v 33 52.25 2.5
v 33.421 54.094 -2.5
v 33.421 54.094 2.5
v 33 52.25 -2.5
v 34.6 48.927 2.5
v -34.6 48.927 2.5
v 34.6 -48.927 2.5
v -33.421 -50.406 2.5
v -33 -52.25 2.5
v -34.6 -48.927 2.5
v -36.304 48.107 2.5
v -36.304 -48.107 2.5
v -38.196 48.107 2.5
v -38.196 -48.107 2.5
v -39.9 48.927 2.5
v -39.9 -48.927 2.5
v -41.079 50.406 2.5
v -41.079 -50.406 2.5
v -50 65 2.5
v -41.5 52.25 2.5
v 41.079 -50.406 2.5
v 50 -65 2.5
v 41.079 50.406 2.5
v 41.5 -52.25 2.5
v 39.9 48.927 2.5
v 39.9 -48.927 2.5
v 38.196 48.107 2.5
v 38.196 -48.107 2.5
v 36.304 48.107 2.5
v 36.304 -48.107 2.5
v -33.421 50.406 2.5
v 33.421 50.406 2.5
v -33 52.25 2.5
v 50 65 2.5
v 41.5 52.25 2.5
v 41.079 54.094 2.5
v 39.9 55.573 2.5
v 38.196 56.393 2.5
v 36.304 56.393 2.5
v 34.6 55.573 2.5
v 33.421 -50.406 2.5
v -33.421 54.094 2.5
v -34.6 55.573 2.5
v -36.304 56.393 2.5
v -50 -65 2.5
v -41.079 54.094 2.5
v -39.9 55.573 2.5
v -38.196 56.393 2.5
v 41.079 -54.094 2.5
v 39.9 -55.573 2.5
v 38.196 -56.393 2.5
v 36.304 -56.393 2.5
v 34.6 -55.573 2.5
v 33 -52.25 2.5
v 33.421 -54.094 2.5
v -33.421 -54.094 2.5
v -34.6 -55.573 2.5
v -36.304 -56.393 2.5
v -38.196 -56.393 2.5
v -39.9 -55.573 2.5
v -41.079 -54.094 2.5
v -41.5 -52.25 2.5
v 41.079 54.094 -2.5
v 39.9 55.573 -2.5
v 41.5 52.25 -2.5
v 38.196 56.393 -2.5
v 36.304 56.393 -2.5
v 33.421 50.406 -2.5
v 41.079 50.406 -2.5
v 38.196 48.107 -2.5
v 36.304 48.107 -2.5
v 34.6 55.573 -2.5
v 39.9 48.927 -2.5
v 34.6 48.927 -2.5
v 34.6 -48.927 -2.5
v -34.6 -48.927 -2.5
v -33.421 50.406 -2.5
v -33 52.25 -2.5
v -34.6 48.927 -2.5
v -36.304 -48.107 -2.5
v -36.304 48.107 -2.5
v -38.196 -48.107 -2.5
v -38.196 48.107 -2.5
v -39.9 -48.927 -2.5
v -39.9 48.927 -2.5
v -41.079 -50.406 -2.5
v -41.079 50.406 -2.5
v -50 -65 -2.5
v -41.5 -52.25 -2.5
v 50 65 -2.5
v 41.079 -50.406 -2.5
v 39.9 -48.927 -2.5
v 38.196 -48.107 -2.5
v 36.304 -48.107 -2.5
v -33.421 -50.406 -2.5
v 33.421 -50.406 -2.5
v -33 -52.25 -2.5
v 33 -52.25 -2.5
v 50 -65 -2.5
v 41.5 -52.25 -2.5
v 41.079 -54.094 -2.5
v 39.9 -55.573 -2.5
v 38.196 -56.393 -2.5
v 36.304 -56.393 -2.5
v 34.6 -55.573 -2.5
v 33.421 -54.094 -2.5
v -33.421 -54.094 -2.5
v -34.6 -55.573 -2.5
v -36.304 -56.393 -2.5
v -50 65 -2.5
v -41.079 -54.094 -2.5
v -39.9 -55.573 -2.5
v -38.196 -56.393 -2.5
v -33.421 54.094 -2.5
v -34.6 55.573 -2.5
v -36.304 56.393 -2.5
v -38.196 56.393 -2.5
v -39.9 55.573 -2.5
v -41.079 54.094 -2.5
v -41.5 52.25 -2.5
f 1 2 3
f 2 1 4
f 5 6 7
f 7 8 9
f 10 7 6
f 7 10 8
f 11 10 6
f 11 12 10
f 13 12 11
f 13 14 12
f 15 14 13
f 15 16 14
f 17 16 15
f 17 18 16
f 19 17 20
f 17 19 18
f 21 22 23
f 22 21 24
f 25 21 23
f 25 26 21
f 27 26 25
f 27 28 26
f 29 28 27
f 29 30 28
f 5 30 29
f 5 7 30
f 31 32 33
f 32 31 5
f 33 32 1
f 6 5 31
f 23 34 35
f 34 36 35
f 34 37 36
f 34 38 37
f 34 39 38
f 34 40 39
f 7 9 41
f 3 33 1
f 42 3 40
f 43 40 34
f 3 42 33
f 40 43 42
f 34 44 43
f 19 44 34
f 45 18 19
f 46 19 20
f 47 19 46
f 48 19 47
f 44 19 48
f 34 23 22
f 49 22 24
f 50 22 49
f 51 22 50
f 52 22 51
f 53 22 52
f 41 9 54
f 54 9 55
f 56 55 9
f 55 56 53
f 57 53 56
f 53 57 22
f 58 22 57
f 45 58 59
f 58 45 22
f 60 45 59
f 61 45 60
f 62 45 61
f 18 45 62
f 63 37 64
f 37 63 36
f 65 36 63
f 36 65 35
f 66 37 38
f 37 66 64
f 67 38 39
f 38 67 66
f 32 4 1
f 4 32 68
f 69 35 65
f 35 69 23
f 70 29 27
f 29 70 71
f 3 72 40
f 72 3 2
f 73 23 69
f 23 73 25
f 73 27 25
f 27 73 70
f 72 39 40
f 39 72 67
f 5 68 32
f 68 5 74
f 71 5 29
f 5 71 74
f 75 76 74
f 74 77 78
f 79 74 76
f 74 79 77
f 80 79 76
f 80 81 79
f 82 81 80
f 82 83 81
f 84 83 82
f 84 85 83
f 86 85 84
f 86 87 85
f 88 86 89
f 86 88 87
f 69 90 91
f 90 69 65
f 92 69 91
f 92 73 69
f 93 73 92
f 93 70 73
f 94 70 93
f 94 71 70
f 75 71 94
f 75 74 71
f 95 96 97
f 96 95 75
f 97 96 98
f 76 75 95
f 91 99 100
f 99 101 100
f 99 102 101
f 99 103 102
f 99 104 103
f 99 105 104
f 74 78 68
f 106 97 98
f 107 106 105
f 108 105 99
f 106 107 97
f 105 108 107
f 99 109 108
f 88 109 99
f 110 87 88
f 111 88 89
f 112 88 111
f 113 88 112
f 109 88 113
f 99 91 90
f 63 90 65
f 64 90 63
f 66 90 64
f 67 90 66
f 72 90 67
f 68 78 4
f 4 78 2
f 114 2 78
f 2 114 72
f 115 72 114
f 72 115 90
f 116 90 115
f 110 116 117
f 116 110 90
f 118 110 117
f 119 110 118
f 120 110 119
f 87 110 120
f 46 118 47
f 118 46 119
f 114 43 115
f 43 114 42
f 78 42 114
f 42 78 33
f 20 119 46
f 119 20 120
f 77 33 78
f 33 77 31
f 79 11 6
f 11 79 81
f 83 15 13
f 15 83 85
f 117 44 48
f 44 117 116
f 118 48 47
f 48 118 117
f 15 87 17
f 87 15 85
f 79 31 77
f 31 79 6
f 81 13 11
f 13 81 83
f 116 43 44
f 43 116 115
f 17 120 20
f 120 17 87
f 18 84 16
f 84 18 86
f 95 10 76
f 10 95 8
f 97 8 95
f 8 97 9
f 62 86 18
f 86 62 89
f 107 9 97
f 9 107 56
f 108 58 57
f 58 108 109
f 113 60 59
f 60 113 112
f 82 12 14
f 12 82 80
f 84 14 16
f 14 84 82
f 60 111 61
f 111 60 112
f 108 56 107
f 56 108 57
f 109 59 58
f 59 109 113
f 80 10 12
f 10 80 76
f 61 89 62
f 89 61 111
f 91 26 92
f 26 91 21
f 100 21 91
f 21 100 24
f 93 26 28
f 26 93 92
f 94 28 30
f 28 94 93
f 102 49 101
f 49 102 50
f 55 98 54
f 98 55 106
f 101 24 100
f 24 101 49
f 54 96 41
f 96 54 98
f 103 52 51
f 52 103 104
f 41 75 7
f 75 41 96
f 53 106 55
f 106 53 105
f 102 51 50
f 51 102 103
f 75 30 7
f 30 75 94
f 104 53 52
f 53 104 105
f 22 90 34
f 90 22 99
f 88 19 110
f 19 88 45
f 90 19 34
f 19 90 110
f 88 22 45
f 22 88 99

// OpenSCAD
// Generated by SolidPython 1.1.3 on 2024-03-13 12:59:54


difference() {
	cube(center = true, size = [100, 130.0000000000, 5]);
	union() {
		translate(v = [37.2500000000, 52.2500000000]) {
			cylinder(center = true, h = 5, r = 4.2500000000);
		}
		translate(v = [-37.2500000000, 52.2500000000]) {
			cylinder(center = true, h = 5, r = 4.2500000000);
		}
		translate(v = [-37.2500000000, -52.2500000000]) {
			cylinder(center = true, h = 5, r = 4.2500000000);
		}
		translate(v = [37.2500000000, -52.2500000000]) {
			cylinder(center = true, h = 5, r = 4.2500000000);
		}
	}
}
/***********************************************
*********      SolidPython code:      **********
************************************************
 
import solid
import numpy as np
import numbers
import pudb
from solid.utils import *
import viewscad
import subprocess
import os
import os.path as osp
import math
import sys

chamfer_extrude=solid.import_scad("./chamfer_extrude.scad")
chamfer_extrude=chamfer_extrude.chamfer_extrude
r = viewscad.Renderer(width=800, height=800)

def debug(model,f_name,path="/home/ts/code/projects/mfd/designs/debug"):
    solid.scad_render_to_file(model,osp.join(path,f_name)+".scad")
#generate position list of wells using offset from center
wells_pos_from_center_4 = lambda offset: [[-offset,offset],
                                        [offset, offset],
                                        [-offset, -offset],
                                        [offset, -offset]]
wells_pos_from_center_2 = lambda offset: [[offset,0],
                                        [-offset,0]]

def make_well(dims,shape=None,height=None,dxf=False):
    def circle_cylinder():
        if dxf or (height is None):
            well = solid.circle(r=dims, segments=64)
        else:
            well = solid.cylinder(r=dims, h=height, segments=64, center = True)
        return well
    if dims is None:
        sys.exit("radius needs to be a number")
    if isinstance(dims, numbers.Number):
        well =circle_cylinder()
    elif len(dims)==1:
        if isinstance(dims[1], numbers.Number):
            well =circle_cylinder()
        else:
            sys.exit("radius needs to be a number")
    elif len(dims)==2:
        well = solid.square(dims,center = True)
    elif len(dims)==3:
        well = solid.cube(dims, center = True)
    return well

def wells_top_bottom(center_gap,device_dims=None,shape=None,height=None, positions = None, dxf = False,well_shape=None):
    if well_shape == None:
        well_shape = make_well(device_dims,shape=shape,height=height,dxf=dxf)
    wells = []
    if positions is None:
        offset = radius+radius/2.0
        positions = wells_pos_from_center_2(offset)
    if dxf or (height is None):
        height = 0
    for position in positions:
        if dxf:
            wells.append(solid.translate([position[0],position[1]])(well_shape))
        else:
            wells.append(solid.translate([position[0],position[1],height/2.0])(well_shape))
    return  union()(*wells)

#place wells in four corners 
def four_corner(radius,height=None, positions = None, dxf = False):
    #if well pos not specified set
    #to equally spaced by half radius
    if positions is None:
        offset = radius+radius/2.0
        positions = wells_pos_from_center_4(offset)
    if dxf or (height is None):
        height = 0
    #make wells at positions with specified radius and height
    wells = []
    for position in positions:
        #make circle if making dxf
        if dxf:
            well_shape = solid.circle(r=radius, segments=64)
            well_shape = solid.translate([position[0],position[1]])(well_shape)
        #if stl make cylinder
        else:
            well_shape = solid.cylinder(r=radius, h=height, segments=64, center = True)
            well_shape = solid.translate([position[0],position[1],height/2.0])(well_shape)
        wells.append(well_shape)
    return  union()(*wells)

#generate channels 
def make_channels(length,width,height=0,num_chans=1,max_chans=None,spacing=None, dxf = False,
                  rotate_channels=False):
    if dxf or (height is None):
        height = 0
    #if channel gap not defined, is equal to
    if spacing is None: spacing = width
    #calculate number of channels if fitting max num within given width
    if not max_chans is None:
        import math
        num_chans = math.floor((max_chans-spacing)/(width+spacing))
    #get total width of channel section  
    total_width = (width*num_chans)+(spacing*(num_chans-1))

    #make template channel
    #if rotate_channels: width, length = length, width
    if dxf:
        channel_t = solid.square([length,width],center = True)
    else:
        channel_t = solid.cube([length,width,height], center = True)

    #if number channels is even, offset the first channel to center its gap
    if num_chans % 2 == 0: centering = -(width/2.0+spacing/2.0)
    else: centering = 0
    #move template channel up to align bottom at z = 0 
    #and offset center if necessary
    if dxf:
        channel_t = solid.translate([0,centering])(channel_t)
    else:
        channel_t = solid.translate([0,centering,height/2.0])(channel_t)

    #if rotate_channels: length,width = width,length
    #start making the channels
    channels = []
    for i in range(num_chans):
        #if i=0 there is no translation
        #if i=1, we make the first channel adjacent to second
        direction = i

        #if i>=1, we add channels alternating left and right
        if i >= 1:
            direction = -(i/2.0)
            if i % 2 == 1: direction = (-direction)+0.5
                
        #make channel at right position and add it to channel list
        translation_coords = [0,direction*(width+spacing)]
        #if rotate_channels: translation_coords = [direction*(width+spacing),0]
        if dxf:
            channel = solid.translate(translation_coords)(channel_t)
        else:
            channel = solid.translate([*translation_coords,0])(channel_t)
        channels.append(channel)
    
    #group all channels as one object
    channels = union()(*channels)
    #compute the x,y,z dimensions in order to pass as arguments 
    #for construction of other parts of device (such as the chambers)
    measurements = {'x':(length/2.0,-length/2.0),
                    'y':(total_width/2.0,-total_width/2.0)}
    if not dxf:
        measurements['z'] = (height,0)
    if rotate_channels:
        channels = solid.rotate(90)(channels)
        measurements['x'],measurements['y']=measurements['y'],measurements['x']
    return channels,measurements

def make_chambers(msrs,height=None,extra=0,len_until=None,width=None, dxf = False):
    #computes x,y,z length
    total = lambda x : abs(x[0]) + abs(x[1])
    
    #if specific height if specified
    #otherwise use same height as channels
    if dxf:
        pass
    elif not height is None:
        msrs['z'] = (height,0)
    else:
        msrs['z'] = (0,0)
        
    #make copy of measurements from channels to modify chamber dimensions 
    #and add length to chambers as specified
    chamber_dims = msrs.copy()
    #calculate length of chamber to reach specified offset
    if not len_until is None:
        chamber_len = len_until-(msrs['x'][0])
    #or add specified length to channel length (if not specified, adds 0)
    else:
        chamber_len = msrs['x'][0]+extra
    #set the chamber length based 
    chamber_dims['x'] = (chamber_len/2.0,-(chamber_len/2.0))
    #compute final dimensions of chamber
    if not width is None:
        chamber_dims['y'] = (width/2.0,-width/2.0)
    chamber_dims = [total(size) for size in chamber_dims.values()]
        
    #calculate chamber translation offset to place adjacent to channels
    chamber_trslt = msrs['x'][0]+(chamber_len/2.0)
    #compute chamber translation coordinates to align with channels
    #x = 1 moves chamber above channels
    #x = -1 moves chamber below channels
    if dxf:
        trslt = lambda x : [x*(chamber_trslt),0]
    else:
        trslt = lambda x : [x*(chamber_trslt),0,msrs['z'][0]/2.0]
    
    #function to make chamber at top or at bottom 
    if dxf:
        move = lambda x : solid.translate(trslt(x))(solid.square(chamber_dims, center = True) )
    else:
        move = lambda x : solid.translate(trslt(x))(solid.cube(chamber_dims,center = True))
    #make top and bottom chambers and return them as grouped
    top = move(1)
    bottom = move(-1)
    #chambers=solid.rotate(90)(solid.union()(top,bottom))
    chambers=(solid.union()(top,bottom))

    return chambers

#create alignment features 
def alignment_features(unit,dims,grid_size, mask_size = None, alignment = "hollow", units_from_center = (2.5,2.5), corner_len=None):
    width = grid_size[0]*dims[0]
    length = grid_size[1]*dims[1]
    if mask_size is None and corner_len is None:
        corner_len = (dims[0] + dims[1]) /2 / 8
    corner = lambda thickness_div : solid.union()( solid.square([corner_len,corner_len/thickness_div],center=False), solid.square([corner_len/thickness_div,corner_len],center=False) )
    
    def make_full(thickness_div):
        thickness = corner_len/thickness_div
        tr = solid.translate([0, 0, 0 ])(solid.rotate(180)(corner(thickness_div)))
        tr = solid.translate([thickness/2,thickness/2,0])(tr)
        bl = solid.translate([0, 0, 0 ])(solid.rotate(0)(corner(thickness_div)))
        bl = solid.translate([-thickness/2,-thickness/2,0])(bl)
        return solid.union()(tr,bl)
    
    def make_hollow(thickness_div):
        thickness = corner_len/(thickness_div/2)
        inner = make_full(thickness_div)
        outer = make_full(thickness_div/2)
        hollow = outer - inner 
        return hollow
    
    center = (width /2 , length/2)
    mask_pos = lambda x,y : (center[0] + x*(float(units_from_center[0])*dims[0]), center[1] + y*(float(units_from_center[1])*dims[1]))
    positions = []
    positions.append(mask_pos(1,0))
    positions.append(mask_pos(0,1))
    positions.append(mask_pos(-1,0))
    positions.append(mask_pos(0,-1))
    make_mask = lambda mtype : make_hollow(8) if mtype == "hollow" else make_full(8)
    masks = [ solid.translate([*position,0])(make_mask(alignment)) for position in positions]
    
    solid.scad_render_to_file(solid.union()(*masks),"./designs/open_chamber/masks.scad")
    #return unit - solid.union()(*masks)
    return solid.union()(*masks,unit)

def create_outline(thickness, array, dims, grid_size,):
    width = grid_size[0]*dims[0] + thickness *2
    length = grid_size[1]*dims[1] + thickness *2
    outer = solid.translate([-thickness, -thickness,0])(solid.square([width, length]))
    return outer-array

def create_wall(wall_thickness, outline_thickness, dims, grid_size, wall_height = 2000, dxf = False):
    inner_width = grid_size[0]*dims[0] + outline_thickness *2
    inner_length = grid_size[1]*dims[1] + outline_thickness *2
    outer_width = inner_width + wall_thickness * 2
    outer_length = inner_length + wall_thickness * 2
    outer_pos_x = -outline_thickness-wall_thickness
    outer_pos_y = -outline_thickness-wall_thickness
    inner_pos_x = -outline_thickness
    inner_pos_y = -outline_thickness
    if dxf:
        inner_wall = solid.translate([inner_pos_x,
                                      inner_pos_y,
                                      0])(solid.square([inner_width, inner_length]))
        outer_wall = solid.translate([outer_pos_x,
                                      outer_pos_y,
                                      0])(solid.square([outer_width, outer_length]))

        return outer_wall-inner_wall
    else:
        inner_wall = solid.translate([inner_pos_x,
                                      inner_pos_y,
                                      0])(solid.cube([inner_width, inner_length,wall_height]))
        outer_wall = solid.translate([outer_pos_x,
                                      outer_pos_y,
                                      0])(solid.cube([outer_width, outer_length,wall_height]))

        return outer_wall-inner_wall, {'wall_height': wall_height,
                                       'wall_thickness': wall_thickness,
                                       'inner_width':inner_width,
                                       'inner_length': inner_length,
                                       'outer_width': outer_width,
                                       'outer_length': outer_length,
                                       'outer_pos_x' : outer_pos_x,
                                       'outer_pos_y' : outer_pos_y,
                                       'inner_pos_x' : inner_pos_x,
                                       'inner_pos_y' : inner_pos_y}

def create_thicker_wall(wall_thickness, outer_wall_offset, wall_dims, dims, grid_size, height_start = .2, height_end=2, dxf = False):
    addon_wall,thicker_wall_dims = create_wall(wall_thickness, outer_wall_offset, dims, grid_size, wall_height=height_end-height_start, dxf = False)
    addon_wall = solid.translate([0,0,height_start])(addon_wall)

    thicker_wall_dims['wall_height'] = height_end
    thicker_wall_dims['wall_thickness'] = wall_dims['wall_thickness'] + wall_thickness
    return addon_wall, thicker_wall_dims
 
def add_lock_to_wall(wall,wall_dims,y_offset = 0,cut_ratio=0.7,L_length=3, gap_ratio=0.05, axis="x",width_ratio=1/2):
    # Makes L shape
    def make_L(max_length,length_thickness,max_width,width_thickness,height,y_offset):
        length = solid.cube([max_length,length_thickness,height])
        width = solid.cube([width_thickness,max_width,height])
        width = solid.translate([max_length-(width_thickness),0,0])(width)
        L = solid.union()(width,length)
        debug(L,"L")
        if axis == "x":
            L = solid.rotate(-90)(L)
            L = solid.translate([0,max_length,0])(L)
        else:
            L = solid.rotate(-180)(L)
            L = solid.translate([max_length,max_width,0])(L)
        return solid.translate([0,0,y_offset])(L)
    
    lock_length = L_length
    lock_width = wall_dims['wall_thickness']*width_ratio
    lock_length_thickness = lock_width/2
    lock_width_thickness = lock_width/2
    L_lock = make_L(lock_length,lock_length_thickness,lock_width,lock_width_thickness, wall_dims['wall_height']-y_offset, y_offset)
    
    margin_space = lock_length - lock_length*(1-gap_ratio)
    key_length = lock_length-margin_space
    key_length_thickness = lock_length_thickness-(margin_space*2)
    key_width = lock_width-(margin_space*2)
    key_width_thickness = lock_width_thickness-(margin_space*2)
    L_key = make_L(key_length,key_length_thickness,key_width,key_width_thickness, wall_dims['wall_height']-y_offset, y_offset)
    L_key = solid.translate([margin_space,margin_space,0])(L_key)
    L = solid.union()(L_lock,L_key)
    debug(L,"L")
    
    #Make cube to be used as negative to split frame in a half
    #Can choose if making left or right negative, specify ratio of split
    def make_negative(right,cut_ratio):
        if axis == "x":
            if right:
                length = wall_dims['outer_length']*(1-cut_ratio)
                pos_x = wall_dims['outer_pos_x']+(wall_dims['outer_length']*cut_ratio)
            else:
                length = wall_dims['outer_length']*(cut_ratio)
                pos_x = wall_dims['outer_pos_x'] 
            negative = solid.cube([wall_dims['outer_width'],length, wall_dims['wall_height']])
            negative = solid.translate([wall_dims['outer_pos_y'],pos_x,0])(negative)
        else:
            if right:
                length = wall_dims['outer_width']*(1-cut_ratio)
                pos_x = wall_dims['outer_pos_y']+(wall_dims['outer_width']*cut_ratio)
            else:
                length = wall_dims['outer_width']*(cut_ratio)
                pos_x = wall_dims['outer_pos_y'] 
            negative = solid.cube([length,wall_dims['outer_length'], wall_dims['wall_height']])
            negative = solid.translate([pos_x,wall_dims['outer_pos_x'],0])(negative)
        return negative, pos_x, length 
                      
    #Make negatives
    negative_right, right_half_pos_x, right_half_length = make_negative(True,cut_ratio)
    negative_left, left_half_pos_x, right_half_length = make_negative(False,cut_ratio)
    #Make halves
    left_half = solid.difference()(wall,negative_right)
    right_half = solid.difference()(wall,negative_left)
    def place_L(L, L_length,L_width):
        #Place L on top wall       
        offset_to_center = (wall_dims['wall_thickness']-L_width)/2
        if axis == "x":
            y_pos_top = (wall_dims['outer_pos_y'] +
                    wall_dims['outer_width'] - 
                    L_width - offset_to_center)
            top_L = solid.translate([y_pos_top,
                                     right_half_pos_x-(L_length),
                                     0])(L)
            #Place L on bottom wall       
            y_pos_bottom = wall_dims['outer_pos_y']+offset_to_center
            bottom_L = solid.translate([y_pos_bottom,
                                        right_half_pos_x-L_length,
                                        0])(L)
        else:
            y_pos_top = (wall_dims['outer_pos_x'] +
                    wall_dims['outer_length'] -
                    (L_width+offset_to_center))
            top_L = solid.translate([right_half_pos_x-L_length,
                                     y_pos_top,
                                     0])(L)
            #Place L on bottom wall       
            y_pos_bottom = wall_dims['outer_pos_y']+offset_to_center
            bottom_L = solid.translate([right_half_pos_x-L_length,
                                        y_pos_bottom,
                                        0])(L)
        return bottom_L, top_L
    #Make complimentary L pieces through union and differences
    #Make Lock
    bottom_L_lock, top_L_lock = place_L(L_lock,L_length,lock_width)
    left_half = solid.difference()(left_half,bottom_L_lock)
    left_half = solid.difference()(left_half,top_L_lock)
    #Make Key
    bottom_L_key, top_L_key = place_L(L_key,L_length,lock_width)
    right_half = solid.union()(right_half,bottom_L_key)
    right_half = solid.union()(right_half,top_L_key)
    return left_half, right_half


#build a row x col grid of containment units
def make_unit_array(unit,dims,grid_size, dxf = False, alignment = None, mask_size = None,
                    units_from_center = None,alignment_offset=None, alignment_mark_size=1):
    units = []
    for col in range(grid_size[1]):
        for row in range(grid_size[0]):
            if dxf:
                units.append(solid.translate([row*dims[0],col*dims[1]])(unit))
            else:
                units.append(solid.translate([row*dims[0],col*dims[1],dims[2]/2.0])(unit))
    array = solid.union()(*units)
    if (not alignment is None) and dxf:
        if not alignment_offset is None:
            array = solid.translate([alignment_offset[0],alignment_offset[1]])(array)
        array = alignment_features(array,dims, grid_size, alignment = alignment, mask_size = None, units_from_center = units_from_center,corner_len=alignment_mark_size)
        if not alignment_offset is None:
            array = solid.translate([-alignment_offset[0],-alignment_offset[1]])(array)
    return array


def make_taylor(wells_pos = wells_pos_from_center_4(2.25), well_rad = 1.5 ,
                well_height = 2, chan_w = 0.01, chan_l = 1, chan_h = 0.010 ,
                chan_gap = 0.040, max_chans = None,num_chans=100, chamber_height  = 0.100,
                columns = 1, rows = 1, chamber_len_until=2.25, add_channels = True, add_wells = True, 
                add_chambers = True, save_path = "./", alignment = None, units_from_center = 2,
                mask_size = None, render_stl = False, outline_thickness = 0.050, dxf = True,
                wall_height = 15, wall_thickness = 0.95, casing_x=9, casing_y=9, casing_z=0,rotate_units=0):

    dims = [casing_x, casing_y, casing_z]
    wells = four_corner(well_rad,well_height, dxf = dxf, positions = wells_pos)
    debug(wells,"wells")
    channels, msrs = make_channels(chan_l,chan_w,chan_h,dxf=dxf, spacing = chan_gap, max_chans=max_chans,num_chans=num_chans)
    debug(channels,"channels")
    chambers = make_chambers(msrs,dxf = dxf, height=chamber_height,len_until=chamber_len_until)
    debug(chambers,"chambers")

    #add together and render
    device_parts = []
    if add_channels:
        device_parts.append(channels)
    if add_wells:
        device_parts.append(wells)
    if add_chambers:
        device_parts.append(chambers)
    device=union()(*device_parts)
    device = rotate(rotate_units)(device)

    device=solid.translate([dims[0]/2.0,dims[1]/2.0,0])(device)
    channels = rotate(rotate_units)(channels)
    channels=solid.translate([dims[0]/2,dims[1]/2,0])(channels)
    chambers_wells = union()(wells,chambers)
    chambers_wells = rotate(rotate_units)(chambers_wells)
    chambers_wells=solid.translate([dims[0]/2,dims[1]/2,0])(chambers_wells)

    file_name = str(rows)+'x'+str(columns)+'_units_'
    grid_size = [rows,columns]

    if alignment:
        alignment="full"
    device = make_unit_array(device,dims,grid_size, dxf=dxf, alignment = alignment,
                                 units_from_center = units_from_center)
    channels = make_unit_array(channels,dims,grid_size, dxf=dxf, alignment = alignment,
                                 units_from_center = units_from_center)
    if alignment=="full":
        alignment="hollow"

    chambers_wells = make_unit_array(chambers_wells,dims,grid_size, dxf=dxf, alignment = alignment,
                                 units_from_center =units_from_center)

    def save_model(model,prefix):
        model_fname = os.path.abspath(save_path+prefix+"_"+file_name+".scad")
        solid.scad_render_to_file(model,model_fname)
        return model_fname

    wells_fname = save_model(wells,"wells")
    channels_fname = save_model(channels,"channels")
    device_fname = save_model(device,"device")
    chambers_wells_fname = save_model(chambers_wells,"chambers_wells")
    return (chambers_wells,chambers_wells_fname), (channels,channels_fname), (device,device_fname)

def make_device(design='open',rows=8,columns=6,wells_pos = 4.5,well_offset=3.2, well_rad=3.2,well_height=0.1,
                chan_l=1,chan_w=0.01,chan_h=0.01,chan_gap=0.015,num_chans=101,dxf=True,save_path="./designs/open_chamber/",
                casing_x=9.0,casing_y=18.0,casing_z=0,rotate_units=90,units_from_center=(3,1),chamber_len_until=4.5,
                chamber_width=None,alignment=True, add_wells=True, add_channels=True,add_chambers=True,well_shape=None):

    dims = [casing_x, casing_y, casing_z]
    if design == "open":
        wells_pos=wells_pos_from_center_2(wells_pos)
        wells = wells_top_bottom(well_offset*2,device_dims=well_rad,height=well_height, dxf = dxf, positions = wells_pos,well_shape=well_shape)
    elif design == "closed":
        wells_pos=wells_pos_from_center_4(wells_pos)
        debug(wells,"wells")
        wells = four_corner(well_offset,well_height,device_dims=well_rad, dxf = dxf, positions = wells_pos)
    else:
        print(design+" is not a valid design.\n Choose valid design: 'open' or 'closed'")
        exit()
    wells = rotate(rotate_units)(wells)
    wells=solid.translate([dims[0]/2,dims[1]/2,0])(wells)
    debug(wells,"wells")

    channels, msrs = make_channels(chan_l,chan_w,chan_h,dxf=dxf, spacing = chan_gap, num_chans=num_chans,rotate_channels=False)
    channels = rotate(rotate_units)(channels)
    channels=solid.translate([dims[0]/2,dims[1]/2,0])(channels)

    chambers=make_chambers(msrs,height=None,extra=0,len_until=chamber_len_until, width=chamber_width,dxf = dxf)
    chambers = rotate(rotate_units)(chambers)
    chambers=solid.translate([dims[0]/2,dims[1]/2,0])(chambers)

    device_parts = []
    if add_channels:
        device_parts.append(channels)
    if add_wells:
        device_parts.append(wells)
    if add_chambers:
        device_parts.append(chambers)
    device = union()(*device_parts)
    #device = rotate(rotate_units)(device)
    #device=solid.translate([dims[0]/2.0,dims[1]/2.0,0])(device)

    chambers_wells = []
    if add_chambers:
        chambers_wells.append(chambers)
    if add_wells:
        chambers_wells.append(wells)
    chambers_wells = union()(*chambers_wells)
    #chambers_wells = union()(wells,chambers)
    #chambers_wells = rotate(rotate_units)(chambers_wells)
    #chambers_wells=solid.translate([dims[0]/2,dims[1]/2,0])(chambers_wells)

    file_name = str(rows)+'x'+str(columns)+'_units_'

    grid_size = [rows,columns]
    if alignment:
        alignment="full"
    device = make_unit_array(device,dims,grid_size, dxf=dxf, alignment = alignment,
                                 units_from_center = units_from_center)
    channels = make_unit_array(channels,dims,grid_size, dxf=dxf, alignment = alignment,
                                 units_from_center = units_from_center)
    if alignment=="full":
        alignment="hollow"

    chambers_wells = make_unit_array(chambers_wells,dims,grid_size, dxf=dxf, alignment = alignment,
                                 units_from_center =units_from_center)

    def save_model(model,prefix):
        model_fname = os.path.abspath(save_path+prefix+"_"+file_name+".scad")
        solid.scad_render_to_file(model,model_fname)
        return model_fname

    wells_fname = save_model(wells,"wells")
    channels_fname = save_model(channels,"channels")
    device_fname = save_model(device,"device")
    chambers_wells_fname = save_model(chambers_wells,"chambers_wells")
    return (chambers_wells,chambers_wells_fname), (channels,channels_fname), (device,device_fname)


def make_open_chamber(rows=8,columns=6,wells_pos = wells_pos_from_center_2(4.5), well_rad=3.2,well_height=0.1,
                      chan_l=1,chan_w=0.01,chan_h=0.01,chan_gap=0.015,num_chans=101,dxf=True,save_path="./designs/open_chamber/",
                      casing_x=9.0,casing_y=18.0,casing_z=0,rotate_units=90,units_from_center=(3,1),chamber_len_until=4.5,
                      chamber_width=None,alignment=True, add_wells=True, add_channels=True,add_chambers=True,well_shape=None):

    dims = [casing_x, casing_y, casing_z]
    wells = wells_top_bottom(well_rad,height=well_height, dxf = dxf, positions = wells_pos, well_shape=well_shape)
    channels, msrs = make_channels(chan_l,chan_w,chan_h,dxf=dxf, spacing = chan_gap, num_chans=num_chans,rotate_channels=False)
    chambers=make_chambers(msrs,height=None,extra=0,len_until=chamber_len_until, width=chamber_width,dxf = dxf)
    debug(chambers,"chambers")
    device_parts = []
    if add_channels:
        device_parts.append(channels)
    if add_wells:
        device_parts.append(wells)
    if add_chambers:
        device_parts.append(chambers)
    device = union()(*device_parts)
    device = rotate(rotate_units)(device)
    device=solid.translate([dims[0]/2.0,dims[1]/2.0,0])(device)
    channels = rotate(rotate_units)(channels)
    channels=solid.translate([dims[0]/2,dims[1]/2,0])(channels)
    chambers_wells = union()(wells,chambers)
    chambers_wells = rotate(rotate_units)(chambers_wells)
    chambers_wells=solid.translate([dims[0]/2,dims[1]/2,0])(chambers_wells)

    file_name = str(rows)+'x'+str(columns)+'_units_'

    grid_size = [rows,columns]
    if alignment:
        alignment="full"
    device = make_unit_array(device,dims,grid_size, dxf=dxf, alignment = alignment,
                                 units_from_center = units_from_center)
    channels = make_unit_array(channels,dims,grid_size, dxf=dxf, alignment = alignment,
                                 units_from_center = units_from_center)
    if alignment=="full":
        alignment="hollow"

    chambers_wells = make_unit_array(chambers_wells,dims,grid_size, dxf=dxf, alignment = alignment,
                                 units_from_center =units_from_center)

    def save_model(model,prefix):
        model_fname = os.path.abspath(save_path+prefix+"_"+file_name+".scad")
        solid.scad_render_to_file(model,model_fname)
        return model_fname

    wells_fname = save_model(wells,"wells")
    channels_fname = save_model(channels,"channels")
    device_fname = save_model(device,"device")
    chambers_wells_fname = save_model(chambers_wells,"chambers_wells")
    return (chambers_wells,chambers_wells_fname), (channels,channels_fname), (device,device_fname)

def to_dxf(scad_path):
    dxf_path = scad_path.replace(".scad",".dxf")
    subprocess.call(["openscad", "-o", dxf_path, scad_path])
    import ezdxf
    temp_dxf = ezdxf.readfile(dxf_path)
    temp_dxf.saveas(dxf_path)

#def make_walls(diameter,thickness,grid_size,dims,height=20,segments=256,make_inner=True):
#    wafer_wall_out = solid.cylinder(r=diameter/2,h=height, segments=segments)
#    wafer_wall_in = solid.cylinder(r=(diameter/2-thickness),h=height, segments=segments)
#    wafer_wall = solid.difference()(wafer_wall_out,wafer_wall_in)
#    wafer_wall = solid.translate([grid_size[1]*dims[1]/2.0,grid_size[0]*dims[0]/2.0])(wafer_wall)
#
#    vertical_wall_length = grid_size[1]*dims[1]
#    horizontal_wall_length = grid_size[0]*dims[0]
#    vertical_wall = solid.cube([vertical_wall_length,thickness,height],center = True)
#    vertical_wall = solid.translate([vertical_wall_length/2,0,height/2])(vertical_wall)
#    horizontal_wall = solid.cube([thickness,horizontal_wall_length,height],center = True)
#    horizontal_wall = solid.translate([0,vertical_wall_length/2,height/2])(horizontal_wall)
#    walls = []
#    walls.append(horizontal_wall)
#    walls.append(vertical_wall)
#    for col in range(grid_size[1]):
#        if col == grid_size[1]-1: 
#            walls.append(solid.translate([0,(col+1)*dims[1]])(vertical_wall))
#        elif col > 0 and col < grid_size[1]-1 and make_inner==True:
#            walls.append(solid.translate([0,(col+1)*dims[1]])(vertical_wall))
#    for row in range(grid_size[0]):
#        if row == grid_size[0]-1: 
#            walls.append(solid.translate([(row+1)*dims[0],0])(horizontal_wall))
#        elif row > 0 and row < grid_size[0]-1 and make_inner==True:
#            walls.append(solid.translate([(row+1)*dims[0],0])(horizontal_wall))
#    walls = union()(*walls)
#    wafer_walls = union()(walls,wafer_wall)
#    return walls,wafer_wall,wafer_walls

def make_walls(diameter,thickness,grid_size,dims,height=20,segments=256,make_inner=True,padx=0,pady=0):
    wafer_wall_out = solid.cylinder(r=diameter/2,h=height, segments=segments)
    wafer_wall_in = solid.cylinder(r=(diameter/2-thickness),h=height, segments=segments)
    wafer_wall = solid.difference()(wafer_wall_out,wafer_wall_in)
    wafer_wall = solid.translate([grid_size[1]*dims[1]/2.0,grid_size[0]*dims[0]/2.0])(wafer_wall)

    vertical_wall_length = grid_size[0]*dims[0]+padx
    horizontal_wall_length = grid_size[1]*dims[1]+pady
    vertical_wall = solid.cube([vertical_wall_length,thickness,height],center = True)
    vertical_wall = solid.translate([vertical_wall_length/2-pady/2,-padx/2,height/2])(vertical_wall)
    horizontal_wall = solid.cube([thickness,horizontal_wall_length,height],center = True)
    horizontal_wall = solid.translate([-pady/2,horizontal_wall_length/2-padx/2,height/2])(horizontal_wall)
    walls = []
    walls.append(horizontal_wall)
    walls.append(vertical_wall)
    for col in range(grid_size[1]):
        if col == grid_size[1]-1: 
            walls.append(solid.translate([0,(col+1)*dims[1]+pady])(vertical_wall))
        elif col > 0 and col < grid_size[1]-1 and make_inner==True:
            walls.append(solid.translate([0,(col+1)*dims[1]])(vertical_wall))
    for row in range(grid_size[0]):
        if row == grid_size[0]-1: 
            walls.append(solid.translate([(row+1)*dims[0]+padx,0])(horizontal_wall))
        elif row > 0 and row < grid_size[0]-1 and make_inner==True:
            walls.append(solid.translate([(row+1)*dims[0],0])(horizontal_wall))
    walls = union()(*walls)
    wafer_walls = union()(walls,wafer_wall)
    return walls,wafer_wall,wafer_walls

def save_model(model,base_path,base_name,dxf=True):
    if not os.path.exists(base_path):
        os.makedirs(base_path)
    dxf_path=osp.join(base_path,base_name+".scad")
    solid.scad_render_to_file(model,osp.join(dxf_path))
    if dxf:
        to_dxf(dxf_path)

def make_wafer(diameter,flat_len,thickness):
    wafer = solid.cylinder(r1=diameter/2,r2=diameter/2,h=thickness,segments=512,)()
    x_start_flat=(flat_len/2)
    y_start_flat = math.sqrt(((diameter/2)**2) - (x_start_flat**2) )
    height_delete_flat=diameter/2-y_start_flat
    flat_delete = solid.cube([flat_len,height_delete_flat,thickness],center=False)()
    flat_delete = solid.translate([-flat_len/2,y_start_flat,0])(flat_delete)
    wafer = solid.difference()(wafer,flat_delete)
    wafer = solid.rotate(90)(wafer)
    return wafer

def add_wafer_to_mask(wafer_size,flat_len,mask,grid_size,dims,wafer_line_thickness=0.1,outer_mask_thickness=5,alignment_offset=None):
    def make_wafer_mask(wafer_size,flat_len):
        wafer_mask = make_wafer(wafer_size,flat_len,1)
        wafer_mask = solid.projection()(wafer_mask)
        wafer_mask = solid.translate([grid_size[0]*dims[0]/2.0,grid_size[1]*dims[1]/2.0])(wafer_mask)
        if not alignment_offset is None:
            wafer_mask = solid.translate([-alignment_offset[0],-alignment_offset[1]])(wafer_mask)
        return wafer_mask

    inner_wafer_line_mask = make_wafer_mask(wafer_size-wafer_line_thickness/2,flat_len)
    outer_wafer_line_mask = make_wafer_mask(wafer_size+wafer_line_thickness/2,flat_len)
    outer_wafer_mask = make_wafer_mask(wafer_size+outer_mask_thickness,flat_len)
    outer_wafer_mask = solid.difference()(outer_wafer_mask,outer_wafer_line_mask)
    wafer_mask = solid.union()(outer_wafer_mask,inner_wafer_line_mask)

    return solid.difference()(wafer_mask,mask)

def make_posts(post_shape,post_height):
    posts = solid.linear_extrude(height=post_height)(post_shape)
    return posts

def make_wafer_empty(diameter,flat_len,thickness,margin,notch_len=20,notch_height=5,oversize=1.01):
    diameter*=oversize
    flat_len*=oversize
    wafer = make_wafer(diameter,flat_len,thickness)
    holder = solid.cylinder(r1=diameter/2+margin,r2=diameter/2+margin,h=thickness,segments=512)()
    holder = solid.difference()(holder,wafer)

    x_start_flat=(flat_len/2)
    y_start_flat = math.sqrt(((diameter/2)**2) - (x_start_flat**2) )
    height_delete_flat=diameter/2-y_start_flat
    notch = solid.cube([notch_len,notch_height,thickness],center=False)()
    notch = solid.translate([-notch_len/2,y_start_flat,0])(notch)
    notch = solid.rotate(90)(notch)
    return solid.difference()(holder,notch)

def wafer_print_calibration(diameter,thickness,height,z_offset):
    circles = []
    radii = []
    radii.append(diameter/2.0*0.8)
    radii.append(diameter/2.0*0.6)
    radii.append(diameter/2.0*0.4)
    radii.append(diameter/2.0*0.2)
    for radius in radii:
        inner = solid.cylinder(r1=radius-(thickness/2.0),r2=radius-(thickness/2.0),h=thickness,segments=512,)()
        outer = solid.cylinder(r1=radius+(thickness/2.0),r2=radius+(thickness/2.0),h=thickness,segments=512,)()
        diff = solid.difference()(outer,inner)
        circles.append(diff)
    circles = solid.union()(*circles)
    circles = solid.translate([0,0,z_offset])(circles)
    return circles

def make_rack(wells,dims,grid_size,alignment_offset,rack_x,rack_y,rack_thickness,bolt_width,add_bolts=True):

    #get X and Y dimensions of gride of pipette tips
    X_len = dims[0]*grid_size[0]
    Y_len = dims[1]*grid_size[1]
    #make rack
    rack = solid.cube([rack_x,rack_y,rack_thickness],center=True)

    if add_bolts:
    #add bolt holes
        bolt_hole=solid.cylinder(r=bolt_width/2,h=rack_thickness,center=True)()
        bolt_holes = []
        bolt_holes.append(solid.translate([rack_x/2-1.5*bolt_width,rack_y/2-1.5*bolt_width])(bolt_hole))
        bolt_holes.append(solid.translate([-rack_x/2+1.5*bolt_width,rack_y/2-1.5*bolt_width])(bolt_hole))
        bolt_holes.append(solid.translate([-rack_x/2+1.5*bolt_width,-rack_y/2+1.5*bolt_width])(bolt_hole))
        bolt_holes.append(solid.translate([rack_x/2-1.5*bolt_width,-rack_y/2+1.5*bolt_width])(bolt_hole))
        bolt_holes = solid.union()(*bolt_holes)
        rack=solid.difference()(rack,bolt_holes)
    rack_support = rack

    #center rack with pipette holes
    rack = solid.translate([0,0,rack_thickness/2])(rack)
    rack = solid.translate([X_len/2,Y_len/2])(rack)
    rack = solid.translate([-alignment_offset[0],-alignment_offset[1]])(rack)
    wells = solid.linear_extrude(height=rack_thickness)(wells)
    rack = solid.difference()(rack,wells)
    return rack, rack_support

def make_pillar(wells,dims,grid_size,alignment_offset,rack_x,rack_y,pillar_height,rack_thickness,bolt_width,add_bolts=True,taper_angle=1,bolt_position_corner=1.5):

    #get X and Y dimensions of gride of pipette tips
    X_len = dims[0]*grid_size[0]
    Y_len = dims[1]*grid_size[1]
    #make rack
    rack = solid.cube([rack_x,rack_y,rack_thickness],center=True)
    
    if add_bolts:
    #add bolt holes
        bolt_hole=solid.cylinder(r=bolt_width/2,h=rack_thickness,center=True)()
        bolt_holes = []
        bolt_holes.append(solid.translate([rack_x/2-bolt_position_corner*bolt_width,rack_y/2-bolt_position_corner*bolt_width])(bolt_hole))
        bolt_holes.append(solid.translate([-rack_x/2+bolt_position_corner*bolt_width,rack_y/2-bolt_position_corner*bolt_width])(bolt_hole))
        bolt_holes.append(solid.translate([-rack_x/2+bolt_position_corner*bolt_width,-rack_y/2+bolt_position_corner*bolt_width])(bolt_hole))
        bolt_holes.append(solid.translate([rack_x/2-bolt_position_corner*bolt_width,-rack_y/2+bolt_position_corner*bolt_width])(bolt_hole))
        bolt_holes = solid.union()(*bolt_holes)
        rack=solid.difference()(rack,bolt_holes)
    rack_support = rack

    #center rack with pipette holes
    #rack = solid.translate([0,0,-rack_thickness])(rack)
    rack = solid.translate([X_len/2,Y_len/2])(rack)
    rack = solid.translate([-alignment_offset[0],-alignment_offset[1]])(rack)
    if not taper_angle == 0:
        wells=chamfer_extrude(pillar_height,taper_angle,segments=20)(wells)
    else:
        wells = solid.linear_extrude(height=pillar_height)(wells)
    rack = solid.union()(rack,wells)
    return rack, rack_support

def deg_taper_len(height,deg):
    if not deg == 0:
        return height*math.tan(math.radians(deg))
    else:
        return 0

def make_outline(inner_dims,wall_thickness,grid_size,dims,alignment_offset):
    inner_dims=np.array(inner_dims)
    inner_outline=solid.square(inner_dims,center=True)
    outer_dims=inner_dims+wall_thickness
    outer_outline=solid.square(outer_dims,center=True)
    outline=solid.difference()(outer_outline,inner_outline)
    outline=solid.translate([grid_size[0]*dims[0]/2.0,grid_size[1]*dims[1]/2.0])(outline)
    return outline








 
 
************************************************/
